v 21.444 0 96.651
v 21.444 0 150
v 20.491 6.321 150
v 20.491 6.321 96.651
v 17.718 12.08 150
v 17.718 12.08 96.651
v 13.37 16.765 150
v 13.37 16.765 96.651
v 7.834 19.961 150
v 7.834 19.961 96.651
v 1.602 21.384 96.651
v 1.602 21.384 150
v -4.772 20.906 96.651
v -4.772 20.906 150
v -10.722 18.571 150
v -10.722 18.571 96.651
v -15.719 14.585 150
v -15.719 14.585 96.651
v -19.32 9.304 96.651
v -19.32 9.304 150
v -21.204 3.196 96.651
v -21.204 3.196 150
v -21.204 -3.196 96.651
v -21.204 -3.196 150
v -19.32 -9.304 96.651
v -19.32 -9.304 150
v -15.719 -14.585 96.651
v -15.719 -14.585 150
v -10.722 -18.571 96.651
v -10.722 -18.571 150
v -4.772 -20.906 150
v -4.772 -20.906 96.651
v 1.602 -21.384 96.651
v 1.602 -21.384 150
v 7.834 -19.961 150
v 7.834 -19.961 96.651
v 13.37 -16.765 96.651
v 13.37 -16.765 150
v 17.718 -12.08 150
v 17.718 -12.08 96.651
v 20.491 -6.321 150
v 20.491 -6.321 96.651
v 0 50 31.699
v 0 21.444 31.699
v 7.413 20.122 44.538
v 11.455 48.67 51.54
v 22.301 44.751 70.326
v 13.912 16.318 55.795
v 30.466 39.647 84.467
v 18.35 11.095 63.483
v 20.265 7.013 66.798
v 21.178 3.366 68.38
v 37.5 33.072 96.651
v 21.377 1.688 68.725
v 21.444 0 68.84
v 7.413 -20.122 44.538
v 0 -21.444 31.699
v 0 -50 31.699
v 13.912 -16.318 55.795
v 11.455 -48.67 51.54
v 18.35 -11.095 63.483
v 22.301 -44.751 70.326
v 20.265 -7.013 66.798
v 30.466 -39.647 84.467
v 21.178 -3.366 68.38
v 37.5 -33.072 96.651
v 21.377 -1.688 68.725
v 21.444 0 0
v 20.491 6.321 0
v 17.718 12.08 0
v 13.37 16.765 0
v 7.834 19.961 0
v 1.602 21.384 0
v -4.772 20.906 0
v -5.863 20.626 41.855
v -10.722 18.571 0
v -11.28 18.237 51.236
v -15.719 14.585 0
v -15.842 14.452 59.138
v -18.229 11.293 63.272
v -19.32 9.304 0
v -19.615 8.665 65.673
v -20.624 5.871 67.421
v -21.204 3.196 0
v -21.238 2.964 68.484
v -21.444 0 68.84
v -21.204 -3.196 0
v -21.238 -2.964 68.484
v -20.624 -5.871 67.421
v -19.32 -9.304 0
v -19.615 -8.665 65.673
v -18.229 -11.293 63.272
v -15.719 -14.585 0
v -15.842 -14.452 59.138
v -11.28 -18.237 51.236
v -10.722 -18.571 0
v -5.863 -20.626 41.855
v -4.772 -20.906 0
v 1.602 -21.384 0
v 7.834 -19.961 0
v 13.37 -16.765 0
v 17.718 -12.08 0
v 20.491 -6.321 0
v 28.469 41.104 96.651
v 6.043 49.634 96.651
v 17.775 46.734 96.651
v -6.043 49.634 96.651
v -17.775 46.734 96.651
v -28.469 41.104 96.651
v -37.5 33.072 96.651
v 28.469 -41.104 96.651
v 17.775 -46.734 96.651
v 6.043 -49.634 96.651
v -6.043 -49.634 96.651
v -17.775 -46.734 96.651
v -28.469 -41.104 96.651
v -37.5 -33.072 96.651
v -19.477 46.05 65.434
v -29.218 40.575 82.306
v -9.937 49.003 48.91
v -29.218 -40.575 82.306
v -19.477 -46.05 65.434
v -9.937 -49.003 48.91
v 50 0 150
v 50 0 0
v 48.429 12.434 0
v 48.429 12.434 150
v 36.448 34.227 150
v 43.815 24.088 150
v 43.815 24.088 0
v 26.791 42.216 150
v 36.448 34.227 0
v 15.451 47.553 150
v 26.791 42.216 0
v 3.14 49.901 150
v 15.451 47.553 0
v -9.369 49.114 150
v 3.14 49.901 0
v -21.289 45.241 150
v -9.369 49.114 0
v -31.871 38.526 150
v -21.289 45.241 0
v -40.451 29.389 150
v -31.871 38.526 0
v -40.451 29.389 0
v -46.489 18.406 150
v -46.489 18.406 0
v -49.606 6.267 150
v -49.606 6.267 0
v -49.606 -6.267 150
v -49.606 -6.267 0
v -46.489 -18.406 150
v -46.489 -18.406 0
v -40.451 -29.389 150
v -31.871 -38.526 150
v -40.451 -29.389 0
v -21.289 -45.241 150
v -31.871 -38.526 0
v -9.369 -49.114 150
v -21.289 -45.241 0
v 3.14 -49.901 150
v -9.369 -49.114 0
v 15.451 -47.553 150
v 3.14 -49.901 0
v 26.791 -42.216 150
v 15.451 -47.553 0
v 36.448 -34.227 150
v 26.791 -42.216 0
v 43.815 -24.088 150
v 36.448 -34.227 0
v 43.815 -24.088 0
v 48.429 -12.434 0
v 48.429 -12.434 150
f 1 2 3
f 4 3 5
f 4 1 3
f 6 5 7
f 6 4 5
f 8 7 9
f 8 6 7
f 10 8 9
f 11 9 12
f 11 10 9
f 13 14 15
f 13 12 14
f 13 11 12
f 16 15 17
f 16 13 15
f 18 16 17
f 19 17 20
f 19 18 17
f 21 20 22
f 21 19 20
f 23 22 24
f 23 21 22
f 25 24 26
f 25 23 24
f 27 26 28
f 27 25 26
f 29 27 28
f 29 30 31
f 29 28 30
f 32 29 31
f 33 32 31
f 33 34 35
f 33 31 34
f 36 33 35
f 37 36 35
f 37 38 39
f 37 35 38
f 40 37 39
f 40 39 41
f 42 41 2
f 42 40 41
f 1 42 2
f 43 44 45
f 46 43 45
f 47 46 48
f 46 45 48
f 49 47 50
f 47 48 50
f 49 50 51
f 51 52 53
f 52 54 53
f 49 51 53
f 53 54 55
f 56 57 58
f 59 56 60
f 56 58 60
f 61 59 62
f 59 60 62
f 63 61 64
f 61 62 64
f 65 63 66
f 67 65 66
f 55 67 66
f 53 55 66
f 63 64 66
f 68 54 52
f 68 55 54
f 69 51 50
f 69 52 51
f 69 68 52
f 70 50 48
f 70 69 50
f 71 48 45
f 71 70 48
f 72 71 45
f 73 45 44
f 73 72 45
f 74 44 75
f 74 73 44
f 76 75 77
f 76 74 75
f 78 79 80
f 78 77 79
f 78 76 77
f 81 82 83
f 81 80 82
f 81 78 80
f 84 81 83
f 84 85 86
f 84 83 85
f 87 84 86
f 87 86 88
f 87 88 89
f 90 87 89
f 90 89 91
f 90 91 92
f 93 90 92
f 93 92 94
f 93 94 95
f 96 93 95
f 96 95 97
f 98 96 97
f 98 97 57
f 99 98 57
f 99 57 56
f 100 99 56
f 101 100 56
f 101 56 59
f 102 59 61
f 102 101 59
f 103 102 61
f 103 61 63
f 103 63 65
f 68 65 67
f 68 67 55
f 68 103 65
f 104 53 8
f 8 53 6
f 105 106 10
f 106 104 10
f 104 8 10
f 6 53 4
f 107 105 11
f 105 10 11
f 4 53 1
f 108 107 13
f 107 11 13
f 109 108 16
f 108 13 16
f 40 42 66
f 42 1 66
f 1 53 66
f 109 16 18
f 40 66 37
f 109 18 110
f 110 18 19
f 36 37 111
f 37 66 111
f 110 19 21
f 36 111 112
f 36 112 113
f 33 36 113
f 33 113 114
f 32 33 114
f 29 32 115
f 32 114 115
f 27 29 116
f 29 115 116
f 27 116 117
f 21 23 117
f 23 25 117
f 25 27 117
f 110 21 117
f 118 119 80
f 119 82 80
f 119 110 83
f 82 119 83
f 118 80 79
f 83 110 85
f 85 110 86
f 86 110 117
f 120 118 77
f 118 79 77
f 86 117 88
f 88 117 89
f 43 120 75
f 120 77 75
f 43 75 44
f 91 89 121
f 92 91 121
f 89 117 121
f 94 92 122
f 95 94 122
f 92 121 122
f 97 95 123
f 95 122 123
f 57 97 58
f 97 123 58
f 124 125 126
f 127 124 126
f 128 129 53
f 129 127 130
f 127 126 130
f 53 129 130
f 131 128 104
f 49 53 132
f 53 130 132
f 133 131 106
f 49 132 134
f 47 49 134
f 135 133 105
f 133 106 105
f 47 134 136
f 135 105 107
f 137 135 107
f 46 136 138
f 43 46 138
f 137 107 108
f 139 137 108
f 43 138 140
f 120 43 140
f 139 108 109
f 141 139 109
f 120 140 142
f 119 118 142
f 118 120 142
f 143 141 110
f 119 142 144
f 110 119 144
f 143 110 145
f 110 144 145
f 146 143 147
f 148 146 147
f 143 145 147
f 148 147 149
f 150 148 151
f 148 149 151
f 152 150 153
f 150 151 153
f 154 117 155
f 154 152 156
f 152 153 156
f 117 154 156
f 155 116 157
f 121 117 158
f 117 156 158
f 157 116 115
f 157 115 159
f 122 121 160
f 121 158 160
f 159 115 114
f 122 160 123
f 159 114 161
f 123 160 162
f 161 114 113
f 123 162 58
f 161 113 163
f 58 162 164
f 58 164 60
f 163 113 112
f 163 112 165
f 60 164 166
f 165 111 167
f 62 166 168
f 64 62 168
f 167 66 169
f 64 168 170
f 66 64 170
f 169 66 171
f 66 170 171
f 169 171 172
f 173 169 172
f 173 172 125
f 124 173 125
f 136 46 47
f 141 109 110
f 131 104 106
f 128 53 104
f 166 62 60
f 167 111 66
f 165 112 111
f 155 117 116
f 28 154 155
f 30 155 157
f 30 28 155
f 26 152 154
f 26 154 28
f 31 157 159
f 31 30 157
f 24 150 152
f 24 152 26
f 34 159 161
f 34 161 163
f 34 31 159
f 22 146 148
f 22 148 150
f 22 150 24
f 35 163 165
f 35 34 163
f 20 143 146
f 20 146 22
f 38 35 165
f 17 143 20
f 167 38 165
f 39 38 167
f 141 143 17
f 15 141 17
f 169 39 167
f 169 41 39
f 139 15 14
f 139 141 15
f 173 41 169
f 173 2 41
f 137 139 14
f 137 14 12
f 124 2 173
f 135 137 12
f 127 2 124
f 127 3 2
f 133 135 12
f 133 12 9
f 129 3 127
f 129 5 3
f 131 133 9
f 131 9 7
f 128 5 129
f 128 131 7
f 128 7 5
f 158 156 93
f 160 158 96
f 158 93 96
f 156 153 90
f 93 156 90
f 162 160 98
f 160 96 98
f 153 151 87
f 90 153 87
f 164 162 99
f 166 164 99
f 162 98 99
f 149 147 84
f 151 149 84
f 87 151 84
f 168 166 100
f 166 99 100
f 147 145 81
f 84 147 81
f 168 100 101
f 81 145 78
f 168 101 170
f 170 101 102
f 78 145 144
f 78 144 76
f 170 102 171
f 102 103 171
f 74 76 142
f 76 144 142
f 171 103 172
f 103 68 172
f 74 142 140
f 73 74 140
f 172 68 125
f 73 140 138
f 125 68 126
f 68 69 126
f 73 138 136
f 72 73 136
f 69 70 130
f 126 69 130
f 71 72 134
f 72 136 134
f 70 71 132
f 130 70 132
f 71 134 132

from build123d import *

# Parameters (mm, degrees)
F0_R     = 50
F1_DEPTH = 150
F2_R     = 21.443612
F3_DEPTH = 150.001
F5_DEPTH = 50.001
F6_DEPTH = 50.001


with BuildPart() as f1:
    # F0 (on Top) → F1 (new body)
    with BuildSketch(Plane.XY):
        Circle(F0_R)
    extrude(amount=F1_DEPTH)

    # F2 (on Top) → F3 (cut, through all)
    with BuildSketch(Plane.XY):
        Circle(F2_R)
    extrude(amount=F3_DEPTH, mode=Mode.SUBTRACT)

    # F4 (on Front) → F5 (cut, through all)
    with BuildSketch(Plane.XZ):
        Polygon((0, 96.650635), (0, 31.69873), (37.5, 96.650635), align=None)
        Polygon((-37.5, 96.650635), (0, 31.69873), (0, 96.650635), align=None)
    extrude(amount=F5_DEPTH, mode=Mode.SUBTRACT)

    # F4 (on Front) → F6 (cut, through all)
    with BuildSketch(Plane.XZ):
        Polygon((0, 96.650635), (0, 31.69873), (37.5, 96.650635), align=None)
        Polygon((-37.5, 96.650635), (0, 31.69873), (0, 96.650635), align=None)
    extrude(amount=-F6_DEPTH, mode=Mode.SUBTRACT)


solid = f1.part
